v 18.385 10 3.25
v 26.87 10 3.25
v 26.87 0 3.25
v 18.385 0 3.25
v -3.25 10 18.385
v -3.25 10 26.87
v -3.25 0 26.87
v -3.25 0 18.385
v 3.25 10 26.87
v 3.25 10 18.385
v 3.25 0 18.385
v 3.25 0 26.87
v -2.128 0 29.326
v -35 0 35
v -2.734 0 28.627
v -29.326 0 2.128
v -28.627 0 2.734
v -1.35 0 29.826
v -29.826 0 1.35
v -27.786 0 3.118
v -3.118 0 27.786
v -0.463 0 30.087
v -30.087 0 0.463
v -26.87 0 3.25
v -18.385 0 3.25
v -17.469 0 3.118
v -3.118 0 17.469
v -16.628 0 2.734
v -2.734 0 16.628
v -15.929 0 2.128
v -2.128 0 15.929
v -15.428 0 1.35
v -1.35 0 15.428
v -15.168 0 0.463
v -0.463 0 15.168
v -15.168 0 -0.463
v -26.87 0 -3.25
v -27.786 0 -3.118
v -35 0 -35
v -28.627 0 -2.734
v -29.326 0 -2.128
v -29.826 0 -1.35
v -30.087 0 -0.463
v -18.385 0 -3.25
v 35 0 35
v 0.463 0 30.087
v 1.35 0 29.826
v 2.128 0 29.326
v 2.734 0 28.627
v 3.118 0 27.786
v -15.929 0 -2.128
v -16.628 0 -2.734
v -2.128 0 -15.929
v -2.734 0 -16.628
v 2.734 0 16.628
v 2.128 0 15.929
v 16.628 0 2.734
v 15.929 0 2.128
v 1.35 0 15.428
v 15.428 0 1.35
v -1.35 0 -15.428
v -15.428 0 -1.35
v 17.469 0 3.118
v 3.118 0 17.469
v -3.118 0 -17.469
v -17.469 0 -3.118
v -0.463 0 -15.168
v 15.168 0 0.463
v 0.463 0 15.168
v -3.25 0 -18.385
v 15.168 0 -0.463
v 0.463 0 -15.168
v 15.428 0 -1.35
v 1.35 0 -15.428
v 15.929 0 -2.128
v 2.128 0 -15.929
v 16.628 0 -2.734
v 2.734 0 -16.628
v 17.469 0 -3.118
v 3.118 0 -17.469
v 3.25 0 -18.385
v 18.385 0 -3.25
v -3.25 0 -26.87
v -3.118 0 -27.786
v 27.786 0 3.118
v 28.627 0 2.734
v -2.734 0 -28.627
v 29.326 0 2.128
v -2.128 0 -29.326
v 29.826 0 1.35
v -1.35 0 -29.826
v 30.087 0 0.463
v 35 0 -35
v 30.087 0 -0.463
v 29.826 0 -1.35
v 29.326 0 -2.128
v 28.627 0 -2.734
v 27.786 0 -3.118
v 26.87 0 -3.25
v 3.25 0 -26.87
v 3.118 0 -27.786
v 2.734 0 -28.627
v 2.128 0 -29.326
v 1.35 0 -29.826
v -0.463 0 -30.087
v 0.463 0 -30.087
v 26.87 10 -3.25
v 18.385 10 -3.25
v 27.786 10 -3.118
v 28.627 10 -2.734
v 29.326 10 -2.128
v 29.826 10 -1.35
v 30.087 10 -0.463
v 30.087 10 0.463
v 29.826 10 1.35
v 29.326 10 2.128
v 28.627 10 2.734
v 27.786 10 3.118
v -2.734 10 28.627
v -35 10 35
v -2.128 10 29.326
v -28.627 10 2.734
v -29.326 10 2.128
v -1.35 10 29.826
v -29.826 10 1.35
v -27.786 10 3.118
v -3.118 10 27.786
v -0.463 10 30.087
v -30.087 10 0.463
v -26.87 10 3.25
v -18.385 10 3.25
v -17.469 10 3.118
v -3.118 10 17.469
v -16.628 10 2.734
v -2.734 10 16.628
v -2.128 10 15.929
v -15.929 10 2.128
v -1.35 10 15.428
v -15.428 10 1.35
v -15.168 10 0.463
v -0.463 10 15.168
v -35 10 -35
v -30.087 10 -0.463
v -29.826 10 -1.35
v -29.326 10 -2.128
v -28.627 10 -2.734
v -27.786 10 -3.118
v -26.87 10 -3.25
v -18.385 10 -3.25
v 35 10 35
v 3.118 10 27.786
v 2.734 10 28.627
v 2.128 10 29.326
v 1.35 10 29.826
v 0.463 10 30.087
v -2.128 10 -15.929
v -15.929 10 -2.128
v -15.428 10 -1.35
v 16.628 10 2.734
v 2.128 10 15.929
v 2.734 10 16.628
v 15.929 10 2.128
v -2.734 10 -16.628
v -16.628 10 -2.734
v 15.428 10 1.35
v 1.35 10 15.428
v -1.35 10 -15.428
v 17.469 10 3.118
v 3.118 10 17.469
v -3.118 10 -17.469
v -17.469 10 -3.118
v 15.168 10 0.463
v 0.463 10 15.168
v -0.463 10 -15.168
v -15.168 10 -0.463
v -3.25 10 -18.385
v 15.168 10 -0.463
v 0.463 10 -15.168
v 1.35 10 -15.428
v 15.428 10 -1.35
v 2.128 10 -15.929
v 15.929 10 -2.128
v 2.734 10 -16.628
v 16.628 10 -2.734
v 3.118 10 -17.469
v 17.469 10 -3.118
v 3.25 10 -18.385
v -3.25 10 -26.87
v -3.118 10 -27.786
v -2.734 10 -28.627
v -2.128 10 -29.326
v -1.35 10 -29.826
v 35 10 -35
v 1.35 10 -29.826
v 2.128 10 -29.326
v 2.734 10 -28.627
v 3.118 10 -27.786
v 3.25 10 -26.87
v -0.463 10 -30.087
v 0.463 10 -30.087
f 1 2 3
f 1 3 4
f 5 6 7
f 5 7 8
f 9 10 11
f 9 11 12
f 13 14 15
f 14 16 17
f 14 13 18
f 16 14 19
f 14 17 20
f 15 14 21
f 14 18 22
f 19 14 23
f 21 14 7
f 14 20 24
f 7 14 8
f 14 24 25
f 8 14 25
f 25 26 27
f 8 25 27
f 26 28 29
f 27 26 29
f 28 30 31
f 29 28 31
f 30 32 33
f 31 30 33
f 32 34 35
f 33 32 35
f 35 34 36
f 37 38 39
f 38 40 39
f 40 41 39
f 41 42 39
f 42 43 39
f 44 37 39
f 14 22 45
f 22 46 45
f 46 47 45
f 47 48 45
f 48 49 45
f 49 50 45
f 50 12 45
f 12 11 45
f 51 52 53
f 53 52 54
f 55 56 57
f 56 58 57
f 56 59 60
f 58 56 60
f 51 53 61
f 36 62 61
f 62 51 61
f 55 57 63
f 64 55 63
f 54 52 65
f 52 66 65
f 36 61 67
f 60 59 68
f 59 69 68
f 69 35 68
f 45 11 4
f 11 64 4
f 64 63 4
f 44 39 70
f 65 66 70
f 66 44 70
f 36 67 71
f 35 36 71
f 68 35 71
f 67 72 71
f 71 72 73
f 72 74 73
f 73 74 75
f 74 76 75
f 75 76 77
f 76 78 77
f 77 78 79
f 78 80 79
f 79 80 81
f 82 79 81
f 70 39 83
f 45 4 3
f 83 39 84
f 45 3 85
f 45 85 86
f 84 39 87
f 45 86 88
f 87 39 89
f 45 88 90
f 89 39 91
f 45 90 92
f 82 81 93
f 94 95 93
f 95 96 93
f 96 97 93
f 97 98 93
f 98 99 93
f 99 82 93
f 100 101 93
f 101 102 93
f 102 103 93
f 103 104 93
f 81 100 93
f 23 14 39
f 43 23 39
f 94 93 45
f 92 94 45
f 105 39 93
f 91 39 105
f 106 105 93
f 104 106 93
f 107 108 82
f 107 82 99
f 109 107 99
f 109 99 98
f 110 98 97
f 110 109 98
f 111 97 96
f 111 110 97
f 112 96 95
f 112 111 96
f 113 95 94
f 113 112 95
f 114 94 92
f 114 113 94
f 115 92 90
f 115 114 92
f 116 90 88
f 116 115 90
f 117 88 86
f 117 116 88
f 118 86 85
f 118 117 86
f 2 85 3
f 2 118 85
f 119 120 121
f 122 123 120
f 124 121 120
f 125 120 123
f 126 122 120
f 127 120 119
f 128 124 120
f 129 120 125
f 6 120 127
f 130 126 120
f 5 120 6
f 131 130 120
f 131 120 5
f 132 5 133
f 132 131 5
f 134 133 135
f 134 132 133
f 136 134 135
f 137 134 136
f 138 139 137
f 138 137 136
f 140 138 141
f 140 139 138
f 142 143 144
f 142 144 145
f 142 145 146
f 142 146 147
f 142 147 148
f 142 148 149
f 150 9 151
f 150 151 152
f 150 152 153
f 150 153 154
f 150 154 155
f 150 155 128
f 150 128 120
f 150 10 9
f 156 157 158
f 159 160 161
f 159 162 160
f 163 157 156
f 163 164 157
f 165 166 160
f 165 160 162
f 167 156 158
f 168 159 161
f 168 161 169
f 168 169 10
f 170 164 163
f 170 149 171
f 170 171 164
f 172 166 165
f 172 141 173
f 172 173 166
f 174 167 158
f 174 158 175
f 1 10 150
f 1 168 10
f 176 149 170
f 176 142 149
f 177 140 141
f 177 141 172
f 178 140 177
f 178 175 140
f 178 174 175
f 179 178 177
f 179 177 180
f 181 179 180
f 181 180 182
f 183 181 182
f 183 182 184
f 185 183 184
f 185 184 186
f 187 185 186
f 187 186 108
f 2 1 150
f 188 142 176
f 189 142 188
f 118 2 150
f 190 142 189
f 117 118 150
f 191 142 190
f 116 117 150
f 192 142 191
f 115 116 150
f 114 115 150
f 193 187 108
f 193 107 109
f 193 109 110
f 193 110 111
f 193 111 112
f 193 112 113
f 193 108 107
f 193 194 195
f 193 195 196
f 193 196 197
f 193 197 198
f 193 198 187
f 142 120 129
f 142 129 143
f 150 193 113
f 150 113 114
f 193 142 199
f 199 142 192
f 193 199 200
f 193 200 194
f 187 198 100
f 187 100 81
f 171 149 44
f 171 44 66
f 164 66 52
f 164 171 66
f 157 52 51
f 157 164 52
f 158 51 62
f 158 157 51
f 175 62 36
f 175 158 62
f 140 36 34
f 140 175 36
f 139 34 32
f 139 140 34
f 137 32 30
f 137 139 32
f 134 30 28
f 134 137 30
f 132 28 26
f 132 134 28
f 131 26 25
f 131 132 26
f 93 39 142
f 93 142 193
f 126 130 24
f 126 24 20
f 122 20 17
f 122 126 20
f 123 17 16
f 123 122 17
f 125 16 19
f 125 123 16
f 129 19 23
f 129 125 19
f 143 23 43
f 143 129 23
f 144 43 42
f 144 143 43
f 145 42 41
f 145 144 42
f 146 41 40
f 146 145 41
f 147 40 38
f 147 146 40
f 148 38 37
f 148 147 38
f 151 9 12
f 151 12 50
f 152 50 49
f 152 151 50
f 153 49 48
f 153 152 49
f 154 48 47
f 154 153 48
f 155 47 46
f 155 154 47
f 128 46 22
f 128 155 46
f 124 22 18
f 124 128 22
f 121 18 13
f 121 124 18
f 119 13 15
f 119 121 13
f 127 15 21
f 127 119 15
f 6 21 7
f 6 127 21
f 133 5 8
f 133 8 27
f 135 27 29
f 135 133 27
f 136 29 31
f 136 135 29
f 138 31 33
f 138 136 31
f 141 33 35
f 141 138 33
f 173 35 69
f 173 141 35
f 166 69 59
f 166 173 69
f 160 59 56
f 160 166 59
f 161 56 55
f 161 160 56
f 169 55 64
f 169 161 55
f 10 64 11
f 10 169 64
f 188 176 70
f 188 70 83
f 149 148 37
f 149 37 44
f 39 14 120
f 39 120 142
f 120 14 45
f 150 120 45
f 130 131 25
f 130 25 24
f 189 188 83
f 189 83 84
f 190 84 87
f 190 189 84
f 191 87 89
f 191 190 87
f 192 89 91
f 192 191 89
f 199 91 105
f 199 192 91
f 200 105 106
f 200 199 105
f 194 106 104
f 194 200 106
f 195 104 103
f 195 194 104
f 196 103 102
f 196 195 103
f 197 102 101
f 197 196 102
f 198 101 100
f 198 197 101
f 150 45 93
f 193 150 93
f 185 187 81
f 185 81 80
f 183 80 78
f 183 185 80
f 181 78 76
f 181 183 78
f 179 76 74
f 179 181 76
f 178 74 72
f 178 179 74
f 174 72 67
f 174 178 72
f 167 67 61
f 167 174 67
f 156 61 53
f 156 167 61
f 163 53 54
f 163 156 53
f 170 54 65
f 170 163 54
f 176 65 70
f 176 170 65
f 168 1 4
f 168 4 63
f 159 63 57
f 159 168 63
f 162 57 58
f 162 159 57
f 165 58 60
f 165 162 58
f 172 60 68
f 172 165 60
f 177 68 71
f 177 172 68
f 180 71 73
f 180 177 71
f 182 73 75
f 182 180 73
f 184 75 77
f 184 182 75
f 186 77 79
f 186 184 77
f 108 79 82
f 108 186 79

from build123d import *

# Parameters (mm, degrees)
SKETCH1_W           = 70
SKETCH1_H           = 70
BOSS_EXTRUDE1_DEPTH = 10
CUT_EXTRUDE1_DEPTH  = 51.497524692


with BuildPart() as part:
    # Sketch1 → Boss-Extrude1 (new body)
    with BuildSketch(Plane(origin=(0, 0, 0), x_dir=(1, 0, 0), z_dir=(0, 1, 0))):
        Rectangle(SKETCH1_W, SKETCH1_H)
    extrude(amount=BOSS_EXTRUDE1_DEPTH)

    # Sketch4 → Cut-Extrude1 (cut, through all)
    with BuildSketch(Plane(origin=(0, 10, 0), x_dir=(1, 0, 0), z_dir=(0, 1, 0))):
        with BuildLine():
            Line((-26.870057685, 3.25), (-18.384776311, 3.25))
            ThreePointArc((-18.384776311, 3.25), (-15.134776311, 0), (-18.384776311, -3.25))
            Line((-18.384776311, -3.25), (-26.870057685, -3.25))
            ThreePointArc((-26.870057685, -3.25), (-30.120057685, 0), (-26.870057685, 3.25))
        make_face()
        with BuildLine():
            Line((3.25, 26.870057685), (3.25, 18.384776311))
            ThreePointArc((3.25, 18.384776311), (0, 15.134776311), (-3.25, 18.384776311))
            Line((-3.25, 18.384776311), (-3.25, 26.870057685))
            ThreePointArc((-3.25, 26.870057685), (0, 30.120057685), (3.25, 26.870057685))
        make_face()
        with BuildLine():
            Line((26.870057685, -3.25), (18.384776311, -3.25))
            ThreePointArc((18.384776311, -3.25), (15.134776311, 0), (18.384776311, 3.25))
            Line((18.384776311, 3.25), (26.870057685, 3.25))
            ThreePointArc((26.870057685, 3.25), (30.120057685, 0), (26.870057685, -3.25))
        make_face()
        with BuildLine():
            Line((-3.25, -26.870057685), (-3.25, -18.384776311))
            ThreePointArc((-3.25, -18.384776311), (0, -15.134776311), (3.25, -18.384776311))
            Line((3.25, -18.384776311), (3.25, -26.870057685))
            ThreePointArc((3.25, -26.870057685), (0, -30.120057685), (-3.25, -26.870057685))
        make_face()
    extrude(amount=-CUT_EXTRUDE1_DEPTH, mode=Mode.SUBTRACT)


solid = part.part
